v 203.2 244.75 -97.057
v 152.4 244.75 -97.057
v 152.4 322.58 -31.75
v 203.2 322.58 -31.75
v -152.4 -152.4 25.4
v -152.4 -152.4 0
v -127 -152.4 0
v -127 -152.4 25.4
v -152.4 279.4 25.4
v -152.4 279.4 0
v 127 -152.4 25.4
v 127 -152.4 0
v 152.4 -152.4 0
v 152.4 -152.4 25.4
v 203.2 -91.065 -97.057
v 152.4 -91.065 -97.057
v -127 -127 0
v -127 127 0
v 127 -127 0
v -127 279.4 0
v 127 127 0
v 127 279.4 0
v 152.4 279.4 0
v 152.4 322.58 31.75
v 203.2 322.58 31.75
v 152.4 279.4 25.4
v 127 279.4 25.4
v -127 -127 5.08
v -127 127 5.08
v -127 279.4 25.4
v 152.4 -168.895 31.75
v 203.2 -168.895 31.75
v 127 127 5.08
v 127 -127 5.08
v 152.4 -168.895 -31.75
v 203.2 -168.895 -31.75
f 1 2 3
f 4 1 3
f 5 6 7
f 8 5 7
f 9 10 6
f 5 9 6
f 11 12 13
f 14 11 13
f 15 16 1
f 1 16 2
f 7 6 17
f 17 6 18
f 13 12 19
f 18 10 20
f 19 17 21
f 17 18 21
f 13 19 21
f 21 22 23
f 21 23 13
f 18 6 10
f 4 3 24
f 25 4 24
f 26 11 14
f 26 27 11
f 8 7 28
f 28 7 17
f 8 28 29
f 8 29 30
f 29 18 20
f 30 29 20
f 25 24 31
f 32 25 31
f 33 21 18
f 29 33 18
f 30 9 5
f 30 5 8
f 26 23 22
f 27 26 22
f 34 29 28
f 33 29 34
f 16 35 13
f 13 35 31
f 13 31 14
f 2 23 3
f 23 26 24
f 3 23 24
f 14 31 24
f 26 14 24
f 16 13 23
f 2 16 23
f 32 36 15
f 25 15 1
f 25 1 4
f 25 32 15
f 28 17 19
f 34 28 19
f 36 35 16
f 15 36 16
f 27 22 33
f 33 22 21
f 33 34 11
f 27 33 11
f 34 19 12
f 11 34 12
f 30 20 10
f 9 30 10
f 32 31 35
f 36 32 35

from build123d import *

# Parameters (mm, degrees)
F1_DEPTH = 5.08
F2_DEPTH = 25.4
F4_DEPTH = 50.8


with BuildPart() as f1:
    # F0 (on Top) → F1 (new body)
    with BuildSketch(Plane.XY):
        Polygon((-127, 127), (-127, -127), (127, -127), (127, 127), (0, 127), align=None)
    extrude(amount=F1_DEPTH)

    # F0 (on Top) → F2 (join)
    with BuildSketch(Plane.XY):
        Polygon((-127, -152.4), (-127, -127), (-127, 127), (-127, 279.4), (-152.4, 279.4), (-152.4, -127), (-152.4, -152.4), align=None)
        Polygon((127, 127), (127, -127), (127, -152.4), (152.4, -152.4), (152.4, -127), (152.4, 279.4), (127, 279.4), align=None)
    extrude(amount=F2_DEPTH)

    # F3 (on face) → F4 (join)
    with BuildSketch(Plane.YZ.offset(152.4)):
        Polygon((168.895449, 31.75), (-168.895449, 31.75), (-168.895449, -31.75), (-91.065334, -97.057221), (244.749885, -97.057221), (322.58, -31.75), (322.58, 31.75), align=None)
    extrude(amount=F4_DEPTH)


solid = f1.part
